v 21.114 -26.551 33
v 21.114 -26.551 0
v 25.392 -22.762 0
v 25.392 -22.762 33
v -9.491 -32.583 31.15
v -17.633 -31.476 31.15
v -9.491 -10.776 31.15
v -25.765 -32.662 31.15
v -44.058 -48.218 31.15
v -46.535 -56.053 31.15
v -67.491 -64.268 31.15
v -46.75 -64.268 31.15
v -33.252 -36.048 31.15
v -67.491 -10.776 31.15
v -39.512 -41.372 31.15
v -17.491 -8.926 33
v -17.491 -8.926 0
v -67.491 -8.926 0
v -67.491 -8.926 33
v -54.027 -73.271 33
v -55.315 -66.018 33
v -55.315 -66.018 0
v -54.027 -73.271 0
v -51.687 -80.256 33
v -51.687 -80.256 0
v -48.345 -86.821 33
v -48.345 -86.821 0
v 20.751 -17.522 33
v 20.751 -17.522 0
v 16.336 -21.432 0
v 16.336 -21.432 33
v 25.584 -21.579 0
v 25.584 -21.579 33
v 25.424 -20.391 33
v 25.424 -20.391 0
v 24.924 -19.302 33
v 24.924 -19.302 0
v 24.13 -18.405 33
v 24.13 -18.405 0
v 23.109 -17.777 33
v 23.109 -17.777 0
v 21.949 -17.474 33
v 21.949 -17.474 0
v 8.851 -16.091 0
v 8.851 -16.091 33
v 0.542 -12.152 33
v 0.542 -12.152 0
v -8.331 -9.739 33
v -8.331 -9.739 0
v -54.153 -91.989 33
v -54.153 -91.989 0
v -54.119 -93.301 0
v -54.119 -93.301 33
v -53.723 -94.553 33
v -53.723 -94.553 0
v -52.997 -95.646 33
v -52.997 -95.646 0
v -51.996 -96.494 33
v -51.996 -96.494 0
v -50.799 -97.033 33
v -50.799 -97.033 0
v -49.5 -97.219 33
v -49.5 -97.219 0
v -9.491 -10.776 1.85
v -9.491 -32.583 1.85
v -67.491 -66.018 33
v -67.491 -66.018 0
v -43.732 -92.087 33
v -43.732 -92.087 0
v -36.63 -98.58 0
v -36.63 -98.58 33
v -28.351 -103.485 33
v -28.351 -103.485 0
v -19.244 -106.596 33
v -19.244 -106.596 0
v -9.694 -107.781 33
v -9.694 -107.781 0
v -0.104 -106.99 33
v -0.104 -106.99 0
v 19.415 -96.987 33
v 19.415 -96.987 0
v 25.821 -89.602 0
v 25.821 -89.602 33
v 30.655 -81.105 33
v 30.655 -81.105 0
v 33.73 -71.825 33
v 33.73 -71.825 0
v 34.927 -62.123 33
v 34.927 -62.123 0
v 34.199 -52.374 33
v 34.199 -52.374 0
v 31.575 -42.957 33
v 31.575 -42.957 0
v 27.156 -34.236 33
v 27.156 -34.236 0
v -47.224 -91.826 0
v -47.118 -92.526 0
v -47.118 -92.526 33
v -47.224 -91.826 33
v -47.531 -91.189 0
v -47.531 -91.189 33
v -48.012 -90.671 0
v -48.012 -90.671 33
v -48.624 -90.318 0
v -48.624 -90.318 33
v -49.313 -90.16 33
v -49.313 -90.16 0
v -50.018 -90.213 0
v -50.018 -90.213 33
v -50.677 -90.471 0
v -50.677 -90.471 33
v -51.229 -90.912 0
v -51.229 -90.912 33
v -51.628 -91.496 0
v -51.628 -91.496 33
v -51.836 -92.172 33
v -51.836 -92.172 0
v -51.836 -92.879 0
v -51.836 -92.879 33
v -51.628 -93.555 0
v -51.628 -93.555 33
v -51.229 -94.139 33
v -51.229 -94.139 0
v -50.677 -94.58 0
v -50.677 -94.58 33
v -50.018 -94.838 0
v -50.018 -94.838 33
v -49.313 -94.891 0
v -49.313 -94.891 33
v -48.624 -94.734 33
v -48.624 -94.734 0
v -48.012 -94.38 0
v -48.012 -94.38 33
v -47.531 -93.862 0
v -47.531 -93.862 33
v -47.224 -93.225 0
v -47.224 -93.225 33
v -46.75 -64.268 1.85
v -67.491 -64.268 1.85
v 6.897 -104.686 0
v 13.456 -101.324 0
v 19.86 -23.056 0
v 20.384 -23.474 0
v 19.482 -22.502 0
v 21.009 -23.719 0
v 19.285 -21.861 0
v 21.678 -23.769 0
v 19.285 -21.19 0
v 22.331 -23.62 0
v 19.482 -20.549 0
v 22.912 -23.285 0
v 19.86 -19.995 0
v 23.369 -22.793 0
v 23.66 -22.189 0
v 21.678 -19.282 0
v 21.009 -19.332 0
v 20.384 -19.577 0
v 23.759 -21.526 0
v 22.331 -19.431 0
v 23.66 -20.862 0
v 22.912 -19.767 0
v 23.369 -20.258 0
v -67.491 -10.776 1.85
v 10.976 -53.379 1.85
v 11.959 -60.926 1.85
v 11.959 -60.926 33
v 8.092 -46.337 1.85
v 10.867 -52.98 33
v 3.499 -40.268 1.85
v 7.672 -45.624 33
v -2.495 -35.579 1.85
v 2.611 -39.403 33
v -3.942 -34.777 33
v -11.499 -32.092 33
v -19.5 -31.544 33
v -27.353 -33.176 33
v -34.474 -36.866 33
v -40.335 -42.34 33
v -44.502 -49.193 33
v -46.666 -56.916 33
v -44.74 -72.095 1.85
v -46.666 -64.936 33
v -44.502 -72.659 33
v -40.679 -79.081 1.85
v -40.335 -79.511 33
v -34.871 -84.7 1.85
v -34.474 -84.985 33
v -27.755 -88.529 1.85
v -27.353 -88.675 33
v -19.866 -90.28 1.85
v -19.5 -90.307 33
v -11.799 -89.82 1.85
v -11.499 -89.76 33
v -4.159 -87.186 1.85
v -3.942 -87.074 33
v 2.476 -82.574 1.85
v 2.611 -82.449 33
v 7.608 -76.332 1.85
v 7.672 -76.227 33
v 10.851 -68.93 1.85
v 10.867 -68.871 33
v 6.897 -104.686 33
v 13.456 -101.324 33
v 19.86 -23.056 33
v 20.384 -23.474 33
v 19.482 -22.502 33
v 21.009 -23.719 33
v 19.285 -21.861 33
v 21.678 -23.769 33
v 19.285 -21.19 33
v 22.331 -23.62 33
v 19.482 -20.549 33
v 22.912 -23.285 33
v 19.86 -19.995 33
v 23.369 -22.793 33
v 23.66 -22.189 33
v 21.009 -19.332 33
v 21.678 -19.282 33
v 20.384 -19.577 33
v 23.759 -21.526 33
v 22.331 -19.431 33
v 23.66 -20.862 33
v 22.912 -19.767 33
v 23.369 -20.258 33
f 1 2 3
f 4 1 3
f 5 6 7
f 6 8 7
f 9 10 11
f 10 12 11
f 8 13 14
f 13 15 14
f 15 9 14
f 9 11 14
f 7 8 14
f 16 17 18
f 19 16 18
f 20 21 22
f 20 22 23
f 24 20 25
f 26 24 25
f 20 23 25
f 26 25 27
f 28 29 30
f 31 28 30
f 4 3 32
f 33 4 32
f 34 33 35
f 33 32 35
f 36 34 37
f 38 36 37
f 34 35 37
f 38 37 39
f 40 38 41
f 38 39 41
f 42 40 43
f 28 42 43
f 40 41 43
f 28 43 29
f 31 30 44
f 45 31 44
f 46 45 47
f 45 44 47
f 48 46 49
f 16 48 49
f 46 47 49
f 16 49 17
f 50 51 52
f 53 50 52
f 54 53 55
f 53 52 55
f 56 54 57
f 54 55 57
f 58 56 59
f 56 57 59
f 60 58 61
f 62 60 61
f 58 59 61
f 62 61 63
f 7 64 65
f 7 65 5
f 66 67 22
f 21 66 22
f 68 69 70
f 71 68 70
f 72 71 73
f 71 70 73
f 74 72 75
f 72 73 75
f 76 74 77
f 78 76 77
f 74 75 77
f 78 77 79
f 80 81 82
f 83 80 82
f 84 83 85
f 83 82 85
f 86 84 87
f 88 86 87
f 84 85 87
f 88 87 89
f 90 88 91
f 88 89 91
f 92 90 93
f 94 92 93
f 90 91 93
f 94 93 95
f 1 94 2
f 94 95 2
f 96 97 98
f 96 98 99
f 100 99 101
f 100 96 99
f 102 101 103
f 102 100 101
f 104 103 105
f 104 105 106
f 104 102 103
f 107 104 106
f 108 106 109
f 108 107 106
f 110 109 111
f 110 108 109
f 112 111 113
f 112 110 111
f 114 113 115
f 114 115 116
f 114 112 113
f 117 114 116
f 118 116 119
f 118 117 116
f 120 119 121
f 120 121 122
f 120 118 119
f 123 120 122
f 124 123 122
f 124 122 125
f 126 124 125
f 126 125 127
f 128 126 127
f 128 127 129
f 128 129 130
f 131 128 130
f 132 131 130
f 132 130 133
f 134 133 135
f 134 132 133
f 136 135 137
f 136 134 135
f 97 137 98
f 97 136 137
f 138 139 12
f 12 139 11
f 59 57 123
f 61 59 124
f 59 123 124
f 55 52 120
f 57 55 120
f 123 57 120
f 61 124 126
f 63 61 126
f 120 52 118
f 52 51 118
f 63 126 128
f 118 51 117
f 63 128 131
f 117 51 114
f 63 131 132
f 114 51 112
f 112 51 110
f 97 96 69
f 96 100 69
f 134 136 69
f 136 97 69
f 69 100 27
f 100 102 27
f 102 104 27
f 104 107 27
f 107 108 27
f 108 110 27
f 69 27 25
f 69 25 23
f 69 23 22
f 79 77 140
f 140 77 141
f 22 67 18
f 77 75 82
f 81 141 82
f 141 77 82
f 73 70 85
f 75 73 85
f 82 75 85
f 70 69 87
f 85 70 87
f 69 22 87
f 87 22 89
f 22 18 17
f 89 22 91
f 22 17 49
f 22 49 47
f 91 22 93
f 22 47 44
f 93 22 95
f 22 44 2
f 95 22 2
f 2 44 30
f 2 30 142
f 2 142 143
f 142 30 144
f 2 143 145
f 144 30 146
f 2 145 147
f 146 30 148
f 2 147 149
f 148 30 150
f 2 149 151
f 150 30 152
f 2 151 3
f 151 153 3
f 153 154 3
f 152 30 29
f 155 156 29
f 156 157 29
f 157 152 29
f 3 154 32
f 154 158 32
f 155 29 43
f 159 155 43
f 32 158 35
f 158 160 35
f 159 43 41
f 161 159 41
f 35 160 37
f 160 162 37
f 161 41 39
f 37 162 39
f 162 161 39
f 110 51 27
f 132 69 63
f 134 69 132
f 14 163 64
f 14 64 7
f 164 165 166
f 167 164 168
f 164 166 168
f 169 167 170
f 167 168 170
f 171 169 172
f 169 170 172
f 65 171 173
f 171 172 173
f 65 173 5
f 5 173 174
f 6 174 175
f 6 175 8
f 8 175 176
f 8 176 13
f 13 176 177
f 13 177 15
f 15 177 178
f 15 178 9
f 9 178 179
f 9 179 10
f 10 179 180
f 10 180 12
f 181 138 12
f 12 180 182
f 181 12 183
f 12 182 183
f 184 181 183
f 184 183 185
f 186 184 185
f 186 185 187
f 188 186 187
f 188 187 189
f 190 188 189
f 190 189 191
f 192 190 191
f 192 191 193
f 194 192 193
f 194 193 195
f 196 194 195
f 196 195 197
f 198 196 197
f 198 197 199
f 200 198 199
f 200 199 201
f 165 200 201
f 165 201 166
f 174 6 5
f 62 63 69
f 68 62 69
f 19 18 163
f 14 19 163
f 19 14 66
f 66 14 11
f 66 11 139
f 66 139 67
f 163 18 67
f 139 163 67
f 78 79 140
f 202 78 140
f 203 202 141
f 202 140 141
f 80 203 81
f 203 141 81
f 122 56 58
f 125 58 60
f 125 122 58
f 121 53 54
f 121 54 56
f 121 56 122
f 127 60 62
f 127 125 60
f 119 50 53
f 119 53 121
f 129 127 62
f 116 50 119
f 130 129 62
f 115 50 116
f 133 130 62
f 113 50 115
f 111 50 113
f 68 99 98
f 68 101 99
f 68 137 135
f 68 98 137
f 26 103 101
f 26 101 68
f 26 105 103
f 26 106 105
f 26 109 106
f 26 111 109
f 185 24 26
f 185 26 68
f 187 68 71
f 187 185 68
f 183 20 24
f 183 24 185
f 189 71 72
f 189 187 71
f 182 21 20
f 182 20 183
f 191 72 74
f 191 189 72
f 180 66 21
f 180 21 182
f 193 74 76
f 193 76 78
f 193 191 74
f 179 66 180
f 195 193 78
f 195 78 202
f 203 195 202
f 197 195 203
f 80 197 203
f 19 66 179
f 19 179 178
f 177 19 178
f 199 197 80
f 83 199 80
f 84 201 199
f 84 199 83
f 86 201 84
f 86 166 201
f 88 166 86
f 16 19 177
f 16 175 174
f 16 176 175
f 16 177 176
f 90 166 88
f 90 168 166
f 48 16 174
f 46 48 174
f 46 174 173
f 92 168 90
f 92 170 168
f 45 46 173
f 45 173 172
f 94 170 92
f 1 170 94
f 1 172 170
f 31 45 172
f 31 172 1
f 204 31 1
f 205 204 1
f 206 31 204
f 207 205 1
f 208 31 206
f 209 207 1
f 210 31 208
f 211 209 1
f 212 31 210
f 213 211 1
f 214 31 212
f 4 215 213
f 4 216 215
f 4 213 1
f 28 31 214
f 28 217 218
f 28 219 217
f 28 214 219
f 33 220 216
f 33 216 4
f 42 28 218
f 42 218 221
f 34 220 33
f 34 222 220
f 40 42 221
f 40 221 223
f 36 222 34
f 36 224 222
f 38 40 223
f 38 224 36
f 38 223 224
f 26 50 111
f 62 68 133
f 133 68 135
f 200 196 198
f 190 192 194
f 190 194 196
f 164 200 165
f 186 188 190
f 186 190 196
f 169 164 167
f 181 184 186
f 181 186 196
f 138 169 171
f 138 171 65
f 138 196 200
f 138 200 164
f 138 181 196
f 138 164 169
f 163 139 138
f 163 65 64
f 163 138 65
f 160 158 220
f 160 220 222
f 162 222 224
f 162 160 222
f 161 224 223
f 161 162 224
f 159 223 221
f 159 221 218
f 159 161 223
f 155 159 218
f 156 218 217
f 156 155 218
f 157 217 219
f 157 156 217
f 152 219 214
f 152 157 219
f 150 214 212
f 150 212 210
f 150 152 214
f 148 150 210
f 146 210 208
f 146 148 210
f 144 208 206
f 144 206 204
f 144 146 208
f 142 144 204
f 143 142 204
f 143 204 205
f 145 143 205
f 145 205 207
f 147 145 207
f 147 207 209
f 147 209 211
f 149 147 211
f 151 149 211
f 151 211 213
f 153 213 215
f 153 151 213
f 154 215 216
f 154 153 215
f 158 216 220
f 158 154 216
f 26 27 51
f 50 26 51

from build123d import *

# Parameters (mm, degrees)
SKETCH1_R           = 2.25
SKETCH1_R_2         = 2.372088477
BOSS_EXTRUDE1_DEPTH = 33
SKETCH2_R           = 29.45
CUT_EXTRUDE1_DEPTH  = 31.15
SKETCH3_W           = 29.3
SKETCH3_H           = 53.492504466
CUT_EXTRUDE2_DEPTH  = 58


with BuildPart() as part:
    # Sketch1 → Boss-Extrude1 (new body)
    with BuildSketch(Plane.XY):
        with BuildLine():
            Line((-67.490537214, -8.925660295), (-67.490537214, -66.018164761))
            Line((-67.490537214, -66.018164761), (-55.315435977, -66.018164761))
            ThreePointArc((-55.315435977, -66.018164761), (-52.985618491, -76.806821645), (-48.344940443, -86.82117505))
            Line((-48.344940443, -86.82117505), (-54.153009969, -91.989482541))
            ThreePointArc((-54.153009969, -91.989482541), (-52.996606833, -95.645534427), (-49.499657733, -97.218852767))
            Line((-49.499657733, -97.218852767), (-43.732472201, -92.086925876))
            ThreePointArc((-43.732472201, -92.086925876), (-23.877416965, -105.274546325), (-0.103624015, -106.99015709))
            ThreePointArc((-0.103624015, -106.99015709), (10.241918426, -103.132381102), (19.415070822, -96.986979642))
            ThreePointArc((19.415070822, -96.986979642), (34.927027694, -62.122719509), (21.114082576, -26.551101781))
            Line((21.114082576, -26.551101781), (25.392497534, -22.761995578))
            ThreePointArc((25.392497534, -22.761995578), (24.56016132, -18.82386048), (20.751489025, -17.521667342))
            Line((20.751489025, -17.521667342), (16.336215646, -21.431979902))
            ThreePointArc((16.336215646, -21.431979902), (0.541775721, -12.152351096), (-17.490537214, -8.925660295))
            Line((-17.490537214, -8.925660295), (-67.490537214, -8.925660295))
        make_face()
        with Locations((21.509462786, -21.525660295)):
            Circle(SKETCH1_R, mode=Mode.SUBTRACT)
        with Locations((-49.490537214, -92.525660295)):
            Circle(SKETCH1_R_2, mode=Mode.SUBTRACT)
    extrude(amount=BOSS_EXTRUDE1_DEPTH)

    # Sketch2 → Cut-Extrude1 (cut)
    with BuildSketch(Plane.XY.offset(33)):
        with Locations((-17.490537214, -60.925660295)):
            Circle(SKETCH2_R)
    extrude(amount=-CUT_EXTRUDE1_DEPTH, mode=Mode.SUBTRACT)

    # Sketch3 → Cut-Extrude2 (cut)
    with BuildSketch(Plane.ZY.offset(67.490537214)):
        with Locations((16.5, -37.521912528)):
            Rectangle(SKETCH3_W, SKETCH3_H)
    extrude(amount=-CUT_EXTRUDE2_DEPTH, mode=Mode.SUBTRACT)


solid = part.part
